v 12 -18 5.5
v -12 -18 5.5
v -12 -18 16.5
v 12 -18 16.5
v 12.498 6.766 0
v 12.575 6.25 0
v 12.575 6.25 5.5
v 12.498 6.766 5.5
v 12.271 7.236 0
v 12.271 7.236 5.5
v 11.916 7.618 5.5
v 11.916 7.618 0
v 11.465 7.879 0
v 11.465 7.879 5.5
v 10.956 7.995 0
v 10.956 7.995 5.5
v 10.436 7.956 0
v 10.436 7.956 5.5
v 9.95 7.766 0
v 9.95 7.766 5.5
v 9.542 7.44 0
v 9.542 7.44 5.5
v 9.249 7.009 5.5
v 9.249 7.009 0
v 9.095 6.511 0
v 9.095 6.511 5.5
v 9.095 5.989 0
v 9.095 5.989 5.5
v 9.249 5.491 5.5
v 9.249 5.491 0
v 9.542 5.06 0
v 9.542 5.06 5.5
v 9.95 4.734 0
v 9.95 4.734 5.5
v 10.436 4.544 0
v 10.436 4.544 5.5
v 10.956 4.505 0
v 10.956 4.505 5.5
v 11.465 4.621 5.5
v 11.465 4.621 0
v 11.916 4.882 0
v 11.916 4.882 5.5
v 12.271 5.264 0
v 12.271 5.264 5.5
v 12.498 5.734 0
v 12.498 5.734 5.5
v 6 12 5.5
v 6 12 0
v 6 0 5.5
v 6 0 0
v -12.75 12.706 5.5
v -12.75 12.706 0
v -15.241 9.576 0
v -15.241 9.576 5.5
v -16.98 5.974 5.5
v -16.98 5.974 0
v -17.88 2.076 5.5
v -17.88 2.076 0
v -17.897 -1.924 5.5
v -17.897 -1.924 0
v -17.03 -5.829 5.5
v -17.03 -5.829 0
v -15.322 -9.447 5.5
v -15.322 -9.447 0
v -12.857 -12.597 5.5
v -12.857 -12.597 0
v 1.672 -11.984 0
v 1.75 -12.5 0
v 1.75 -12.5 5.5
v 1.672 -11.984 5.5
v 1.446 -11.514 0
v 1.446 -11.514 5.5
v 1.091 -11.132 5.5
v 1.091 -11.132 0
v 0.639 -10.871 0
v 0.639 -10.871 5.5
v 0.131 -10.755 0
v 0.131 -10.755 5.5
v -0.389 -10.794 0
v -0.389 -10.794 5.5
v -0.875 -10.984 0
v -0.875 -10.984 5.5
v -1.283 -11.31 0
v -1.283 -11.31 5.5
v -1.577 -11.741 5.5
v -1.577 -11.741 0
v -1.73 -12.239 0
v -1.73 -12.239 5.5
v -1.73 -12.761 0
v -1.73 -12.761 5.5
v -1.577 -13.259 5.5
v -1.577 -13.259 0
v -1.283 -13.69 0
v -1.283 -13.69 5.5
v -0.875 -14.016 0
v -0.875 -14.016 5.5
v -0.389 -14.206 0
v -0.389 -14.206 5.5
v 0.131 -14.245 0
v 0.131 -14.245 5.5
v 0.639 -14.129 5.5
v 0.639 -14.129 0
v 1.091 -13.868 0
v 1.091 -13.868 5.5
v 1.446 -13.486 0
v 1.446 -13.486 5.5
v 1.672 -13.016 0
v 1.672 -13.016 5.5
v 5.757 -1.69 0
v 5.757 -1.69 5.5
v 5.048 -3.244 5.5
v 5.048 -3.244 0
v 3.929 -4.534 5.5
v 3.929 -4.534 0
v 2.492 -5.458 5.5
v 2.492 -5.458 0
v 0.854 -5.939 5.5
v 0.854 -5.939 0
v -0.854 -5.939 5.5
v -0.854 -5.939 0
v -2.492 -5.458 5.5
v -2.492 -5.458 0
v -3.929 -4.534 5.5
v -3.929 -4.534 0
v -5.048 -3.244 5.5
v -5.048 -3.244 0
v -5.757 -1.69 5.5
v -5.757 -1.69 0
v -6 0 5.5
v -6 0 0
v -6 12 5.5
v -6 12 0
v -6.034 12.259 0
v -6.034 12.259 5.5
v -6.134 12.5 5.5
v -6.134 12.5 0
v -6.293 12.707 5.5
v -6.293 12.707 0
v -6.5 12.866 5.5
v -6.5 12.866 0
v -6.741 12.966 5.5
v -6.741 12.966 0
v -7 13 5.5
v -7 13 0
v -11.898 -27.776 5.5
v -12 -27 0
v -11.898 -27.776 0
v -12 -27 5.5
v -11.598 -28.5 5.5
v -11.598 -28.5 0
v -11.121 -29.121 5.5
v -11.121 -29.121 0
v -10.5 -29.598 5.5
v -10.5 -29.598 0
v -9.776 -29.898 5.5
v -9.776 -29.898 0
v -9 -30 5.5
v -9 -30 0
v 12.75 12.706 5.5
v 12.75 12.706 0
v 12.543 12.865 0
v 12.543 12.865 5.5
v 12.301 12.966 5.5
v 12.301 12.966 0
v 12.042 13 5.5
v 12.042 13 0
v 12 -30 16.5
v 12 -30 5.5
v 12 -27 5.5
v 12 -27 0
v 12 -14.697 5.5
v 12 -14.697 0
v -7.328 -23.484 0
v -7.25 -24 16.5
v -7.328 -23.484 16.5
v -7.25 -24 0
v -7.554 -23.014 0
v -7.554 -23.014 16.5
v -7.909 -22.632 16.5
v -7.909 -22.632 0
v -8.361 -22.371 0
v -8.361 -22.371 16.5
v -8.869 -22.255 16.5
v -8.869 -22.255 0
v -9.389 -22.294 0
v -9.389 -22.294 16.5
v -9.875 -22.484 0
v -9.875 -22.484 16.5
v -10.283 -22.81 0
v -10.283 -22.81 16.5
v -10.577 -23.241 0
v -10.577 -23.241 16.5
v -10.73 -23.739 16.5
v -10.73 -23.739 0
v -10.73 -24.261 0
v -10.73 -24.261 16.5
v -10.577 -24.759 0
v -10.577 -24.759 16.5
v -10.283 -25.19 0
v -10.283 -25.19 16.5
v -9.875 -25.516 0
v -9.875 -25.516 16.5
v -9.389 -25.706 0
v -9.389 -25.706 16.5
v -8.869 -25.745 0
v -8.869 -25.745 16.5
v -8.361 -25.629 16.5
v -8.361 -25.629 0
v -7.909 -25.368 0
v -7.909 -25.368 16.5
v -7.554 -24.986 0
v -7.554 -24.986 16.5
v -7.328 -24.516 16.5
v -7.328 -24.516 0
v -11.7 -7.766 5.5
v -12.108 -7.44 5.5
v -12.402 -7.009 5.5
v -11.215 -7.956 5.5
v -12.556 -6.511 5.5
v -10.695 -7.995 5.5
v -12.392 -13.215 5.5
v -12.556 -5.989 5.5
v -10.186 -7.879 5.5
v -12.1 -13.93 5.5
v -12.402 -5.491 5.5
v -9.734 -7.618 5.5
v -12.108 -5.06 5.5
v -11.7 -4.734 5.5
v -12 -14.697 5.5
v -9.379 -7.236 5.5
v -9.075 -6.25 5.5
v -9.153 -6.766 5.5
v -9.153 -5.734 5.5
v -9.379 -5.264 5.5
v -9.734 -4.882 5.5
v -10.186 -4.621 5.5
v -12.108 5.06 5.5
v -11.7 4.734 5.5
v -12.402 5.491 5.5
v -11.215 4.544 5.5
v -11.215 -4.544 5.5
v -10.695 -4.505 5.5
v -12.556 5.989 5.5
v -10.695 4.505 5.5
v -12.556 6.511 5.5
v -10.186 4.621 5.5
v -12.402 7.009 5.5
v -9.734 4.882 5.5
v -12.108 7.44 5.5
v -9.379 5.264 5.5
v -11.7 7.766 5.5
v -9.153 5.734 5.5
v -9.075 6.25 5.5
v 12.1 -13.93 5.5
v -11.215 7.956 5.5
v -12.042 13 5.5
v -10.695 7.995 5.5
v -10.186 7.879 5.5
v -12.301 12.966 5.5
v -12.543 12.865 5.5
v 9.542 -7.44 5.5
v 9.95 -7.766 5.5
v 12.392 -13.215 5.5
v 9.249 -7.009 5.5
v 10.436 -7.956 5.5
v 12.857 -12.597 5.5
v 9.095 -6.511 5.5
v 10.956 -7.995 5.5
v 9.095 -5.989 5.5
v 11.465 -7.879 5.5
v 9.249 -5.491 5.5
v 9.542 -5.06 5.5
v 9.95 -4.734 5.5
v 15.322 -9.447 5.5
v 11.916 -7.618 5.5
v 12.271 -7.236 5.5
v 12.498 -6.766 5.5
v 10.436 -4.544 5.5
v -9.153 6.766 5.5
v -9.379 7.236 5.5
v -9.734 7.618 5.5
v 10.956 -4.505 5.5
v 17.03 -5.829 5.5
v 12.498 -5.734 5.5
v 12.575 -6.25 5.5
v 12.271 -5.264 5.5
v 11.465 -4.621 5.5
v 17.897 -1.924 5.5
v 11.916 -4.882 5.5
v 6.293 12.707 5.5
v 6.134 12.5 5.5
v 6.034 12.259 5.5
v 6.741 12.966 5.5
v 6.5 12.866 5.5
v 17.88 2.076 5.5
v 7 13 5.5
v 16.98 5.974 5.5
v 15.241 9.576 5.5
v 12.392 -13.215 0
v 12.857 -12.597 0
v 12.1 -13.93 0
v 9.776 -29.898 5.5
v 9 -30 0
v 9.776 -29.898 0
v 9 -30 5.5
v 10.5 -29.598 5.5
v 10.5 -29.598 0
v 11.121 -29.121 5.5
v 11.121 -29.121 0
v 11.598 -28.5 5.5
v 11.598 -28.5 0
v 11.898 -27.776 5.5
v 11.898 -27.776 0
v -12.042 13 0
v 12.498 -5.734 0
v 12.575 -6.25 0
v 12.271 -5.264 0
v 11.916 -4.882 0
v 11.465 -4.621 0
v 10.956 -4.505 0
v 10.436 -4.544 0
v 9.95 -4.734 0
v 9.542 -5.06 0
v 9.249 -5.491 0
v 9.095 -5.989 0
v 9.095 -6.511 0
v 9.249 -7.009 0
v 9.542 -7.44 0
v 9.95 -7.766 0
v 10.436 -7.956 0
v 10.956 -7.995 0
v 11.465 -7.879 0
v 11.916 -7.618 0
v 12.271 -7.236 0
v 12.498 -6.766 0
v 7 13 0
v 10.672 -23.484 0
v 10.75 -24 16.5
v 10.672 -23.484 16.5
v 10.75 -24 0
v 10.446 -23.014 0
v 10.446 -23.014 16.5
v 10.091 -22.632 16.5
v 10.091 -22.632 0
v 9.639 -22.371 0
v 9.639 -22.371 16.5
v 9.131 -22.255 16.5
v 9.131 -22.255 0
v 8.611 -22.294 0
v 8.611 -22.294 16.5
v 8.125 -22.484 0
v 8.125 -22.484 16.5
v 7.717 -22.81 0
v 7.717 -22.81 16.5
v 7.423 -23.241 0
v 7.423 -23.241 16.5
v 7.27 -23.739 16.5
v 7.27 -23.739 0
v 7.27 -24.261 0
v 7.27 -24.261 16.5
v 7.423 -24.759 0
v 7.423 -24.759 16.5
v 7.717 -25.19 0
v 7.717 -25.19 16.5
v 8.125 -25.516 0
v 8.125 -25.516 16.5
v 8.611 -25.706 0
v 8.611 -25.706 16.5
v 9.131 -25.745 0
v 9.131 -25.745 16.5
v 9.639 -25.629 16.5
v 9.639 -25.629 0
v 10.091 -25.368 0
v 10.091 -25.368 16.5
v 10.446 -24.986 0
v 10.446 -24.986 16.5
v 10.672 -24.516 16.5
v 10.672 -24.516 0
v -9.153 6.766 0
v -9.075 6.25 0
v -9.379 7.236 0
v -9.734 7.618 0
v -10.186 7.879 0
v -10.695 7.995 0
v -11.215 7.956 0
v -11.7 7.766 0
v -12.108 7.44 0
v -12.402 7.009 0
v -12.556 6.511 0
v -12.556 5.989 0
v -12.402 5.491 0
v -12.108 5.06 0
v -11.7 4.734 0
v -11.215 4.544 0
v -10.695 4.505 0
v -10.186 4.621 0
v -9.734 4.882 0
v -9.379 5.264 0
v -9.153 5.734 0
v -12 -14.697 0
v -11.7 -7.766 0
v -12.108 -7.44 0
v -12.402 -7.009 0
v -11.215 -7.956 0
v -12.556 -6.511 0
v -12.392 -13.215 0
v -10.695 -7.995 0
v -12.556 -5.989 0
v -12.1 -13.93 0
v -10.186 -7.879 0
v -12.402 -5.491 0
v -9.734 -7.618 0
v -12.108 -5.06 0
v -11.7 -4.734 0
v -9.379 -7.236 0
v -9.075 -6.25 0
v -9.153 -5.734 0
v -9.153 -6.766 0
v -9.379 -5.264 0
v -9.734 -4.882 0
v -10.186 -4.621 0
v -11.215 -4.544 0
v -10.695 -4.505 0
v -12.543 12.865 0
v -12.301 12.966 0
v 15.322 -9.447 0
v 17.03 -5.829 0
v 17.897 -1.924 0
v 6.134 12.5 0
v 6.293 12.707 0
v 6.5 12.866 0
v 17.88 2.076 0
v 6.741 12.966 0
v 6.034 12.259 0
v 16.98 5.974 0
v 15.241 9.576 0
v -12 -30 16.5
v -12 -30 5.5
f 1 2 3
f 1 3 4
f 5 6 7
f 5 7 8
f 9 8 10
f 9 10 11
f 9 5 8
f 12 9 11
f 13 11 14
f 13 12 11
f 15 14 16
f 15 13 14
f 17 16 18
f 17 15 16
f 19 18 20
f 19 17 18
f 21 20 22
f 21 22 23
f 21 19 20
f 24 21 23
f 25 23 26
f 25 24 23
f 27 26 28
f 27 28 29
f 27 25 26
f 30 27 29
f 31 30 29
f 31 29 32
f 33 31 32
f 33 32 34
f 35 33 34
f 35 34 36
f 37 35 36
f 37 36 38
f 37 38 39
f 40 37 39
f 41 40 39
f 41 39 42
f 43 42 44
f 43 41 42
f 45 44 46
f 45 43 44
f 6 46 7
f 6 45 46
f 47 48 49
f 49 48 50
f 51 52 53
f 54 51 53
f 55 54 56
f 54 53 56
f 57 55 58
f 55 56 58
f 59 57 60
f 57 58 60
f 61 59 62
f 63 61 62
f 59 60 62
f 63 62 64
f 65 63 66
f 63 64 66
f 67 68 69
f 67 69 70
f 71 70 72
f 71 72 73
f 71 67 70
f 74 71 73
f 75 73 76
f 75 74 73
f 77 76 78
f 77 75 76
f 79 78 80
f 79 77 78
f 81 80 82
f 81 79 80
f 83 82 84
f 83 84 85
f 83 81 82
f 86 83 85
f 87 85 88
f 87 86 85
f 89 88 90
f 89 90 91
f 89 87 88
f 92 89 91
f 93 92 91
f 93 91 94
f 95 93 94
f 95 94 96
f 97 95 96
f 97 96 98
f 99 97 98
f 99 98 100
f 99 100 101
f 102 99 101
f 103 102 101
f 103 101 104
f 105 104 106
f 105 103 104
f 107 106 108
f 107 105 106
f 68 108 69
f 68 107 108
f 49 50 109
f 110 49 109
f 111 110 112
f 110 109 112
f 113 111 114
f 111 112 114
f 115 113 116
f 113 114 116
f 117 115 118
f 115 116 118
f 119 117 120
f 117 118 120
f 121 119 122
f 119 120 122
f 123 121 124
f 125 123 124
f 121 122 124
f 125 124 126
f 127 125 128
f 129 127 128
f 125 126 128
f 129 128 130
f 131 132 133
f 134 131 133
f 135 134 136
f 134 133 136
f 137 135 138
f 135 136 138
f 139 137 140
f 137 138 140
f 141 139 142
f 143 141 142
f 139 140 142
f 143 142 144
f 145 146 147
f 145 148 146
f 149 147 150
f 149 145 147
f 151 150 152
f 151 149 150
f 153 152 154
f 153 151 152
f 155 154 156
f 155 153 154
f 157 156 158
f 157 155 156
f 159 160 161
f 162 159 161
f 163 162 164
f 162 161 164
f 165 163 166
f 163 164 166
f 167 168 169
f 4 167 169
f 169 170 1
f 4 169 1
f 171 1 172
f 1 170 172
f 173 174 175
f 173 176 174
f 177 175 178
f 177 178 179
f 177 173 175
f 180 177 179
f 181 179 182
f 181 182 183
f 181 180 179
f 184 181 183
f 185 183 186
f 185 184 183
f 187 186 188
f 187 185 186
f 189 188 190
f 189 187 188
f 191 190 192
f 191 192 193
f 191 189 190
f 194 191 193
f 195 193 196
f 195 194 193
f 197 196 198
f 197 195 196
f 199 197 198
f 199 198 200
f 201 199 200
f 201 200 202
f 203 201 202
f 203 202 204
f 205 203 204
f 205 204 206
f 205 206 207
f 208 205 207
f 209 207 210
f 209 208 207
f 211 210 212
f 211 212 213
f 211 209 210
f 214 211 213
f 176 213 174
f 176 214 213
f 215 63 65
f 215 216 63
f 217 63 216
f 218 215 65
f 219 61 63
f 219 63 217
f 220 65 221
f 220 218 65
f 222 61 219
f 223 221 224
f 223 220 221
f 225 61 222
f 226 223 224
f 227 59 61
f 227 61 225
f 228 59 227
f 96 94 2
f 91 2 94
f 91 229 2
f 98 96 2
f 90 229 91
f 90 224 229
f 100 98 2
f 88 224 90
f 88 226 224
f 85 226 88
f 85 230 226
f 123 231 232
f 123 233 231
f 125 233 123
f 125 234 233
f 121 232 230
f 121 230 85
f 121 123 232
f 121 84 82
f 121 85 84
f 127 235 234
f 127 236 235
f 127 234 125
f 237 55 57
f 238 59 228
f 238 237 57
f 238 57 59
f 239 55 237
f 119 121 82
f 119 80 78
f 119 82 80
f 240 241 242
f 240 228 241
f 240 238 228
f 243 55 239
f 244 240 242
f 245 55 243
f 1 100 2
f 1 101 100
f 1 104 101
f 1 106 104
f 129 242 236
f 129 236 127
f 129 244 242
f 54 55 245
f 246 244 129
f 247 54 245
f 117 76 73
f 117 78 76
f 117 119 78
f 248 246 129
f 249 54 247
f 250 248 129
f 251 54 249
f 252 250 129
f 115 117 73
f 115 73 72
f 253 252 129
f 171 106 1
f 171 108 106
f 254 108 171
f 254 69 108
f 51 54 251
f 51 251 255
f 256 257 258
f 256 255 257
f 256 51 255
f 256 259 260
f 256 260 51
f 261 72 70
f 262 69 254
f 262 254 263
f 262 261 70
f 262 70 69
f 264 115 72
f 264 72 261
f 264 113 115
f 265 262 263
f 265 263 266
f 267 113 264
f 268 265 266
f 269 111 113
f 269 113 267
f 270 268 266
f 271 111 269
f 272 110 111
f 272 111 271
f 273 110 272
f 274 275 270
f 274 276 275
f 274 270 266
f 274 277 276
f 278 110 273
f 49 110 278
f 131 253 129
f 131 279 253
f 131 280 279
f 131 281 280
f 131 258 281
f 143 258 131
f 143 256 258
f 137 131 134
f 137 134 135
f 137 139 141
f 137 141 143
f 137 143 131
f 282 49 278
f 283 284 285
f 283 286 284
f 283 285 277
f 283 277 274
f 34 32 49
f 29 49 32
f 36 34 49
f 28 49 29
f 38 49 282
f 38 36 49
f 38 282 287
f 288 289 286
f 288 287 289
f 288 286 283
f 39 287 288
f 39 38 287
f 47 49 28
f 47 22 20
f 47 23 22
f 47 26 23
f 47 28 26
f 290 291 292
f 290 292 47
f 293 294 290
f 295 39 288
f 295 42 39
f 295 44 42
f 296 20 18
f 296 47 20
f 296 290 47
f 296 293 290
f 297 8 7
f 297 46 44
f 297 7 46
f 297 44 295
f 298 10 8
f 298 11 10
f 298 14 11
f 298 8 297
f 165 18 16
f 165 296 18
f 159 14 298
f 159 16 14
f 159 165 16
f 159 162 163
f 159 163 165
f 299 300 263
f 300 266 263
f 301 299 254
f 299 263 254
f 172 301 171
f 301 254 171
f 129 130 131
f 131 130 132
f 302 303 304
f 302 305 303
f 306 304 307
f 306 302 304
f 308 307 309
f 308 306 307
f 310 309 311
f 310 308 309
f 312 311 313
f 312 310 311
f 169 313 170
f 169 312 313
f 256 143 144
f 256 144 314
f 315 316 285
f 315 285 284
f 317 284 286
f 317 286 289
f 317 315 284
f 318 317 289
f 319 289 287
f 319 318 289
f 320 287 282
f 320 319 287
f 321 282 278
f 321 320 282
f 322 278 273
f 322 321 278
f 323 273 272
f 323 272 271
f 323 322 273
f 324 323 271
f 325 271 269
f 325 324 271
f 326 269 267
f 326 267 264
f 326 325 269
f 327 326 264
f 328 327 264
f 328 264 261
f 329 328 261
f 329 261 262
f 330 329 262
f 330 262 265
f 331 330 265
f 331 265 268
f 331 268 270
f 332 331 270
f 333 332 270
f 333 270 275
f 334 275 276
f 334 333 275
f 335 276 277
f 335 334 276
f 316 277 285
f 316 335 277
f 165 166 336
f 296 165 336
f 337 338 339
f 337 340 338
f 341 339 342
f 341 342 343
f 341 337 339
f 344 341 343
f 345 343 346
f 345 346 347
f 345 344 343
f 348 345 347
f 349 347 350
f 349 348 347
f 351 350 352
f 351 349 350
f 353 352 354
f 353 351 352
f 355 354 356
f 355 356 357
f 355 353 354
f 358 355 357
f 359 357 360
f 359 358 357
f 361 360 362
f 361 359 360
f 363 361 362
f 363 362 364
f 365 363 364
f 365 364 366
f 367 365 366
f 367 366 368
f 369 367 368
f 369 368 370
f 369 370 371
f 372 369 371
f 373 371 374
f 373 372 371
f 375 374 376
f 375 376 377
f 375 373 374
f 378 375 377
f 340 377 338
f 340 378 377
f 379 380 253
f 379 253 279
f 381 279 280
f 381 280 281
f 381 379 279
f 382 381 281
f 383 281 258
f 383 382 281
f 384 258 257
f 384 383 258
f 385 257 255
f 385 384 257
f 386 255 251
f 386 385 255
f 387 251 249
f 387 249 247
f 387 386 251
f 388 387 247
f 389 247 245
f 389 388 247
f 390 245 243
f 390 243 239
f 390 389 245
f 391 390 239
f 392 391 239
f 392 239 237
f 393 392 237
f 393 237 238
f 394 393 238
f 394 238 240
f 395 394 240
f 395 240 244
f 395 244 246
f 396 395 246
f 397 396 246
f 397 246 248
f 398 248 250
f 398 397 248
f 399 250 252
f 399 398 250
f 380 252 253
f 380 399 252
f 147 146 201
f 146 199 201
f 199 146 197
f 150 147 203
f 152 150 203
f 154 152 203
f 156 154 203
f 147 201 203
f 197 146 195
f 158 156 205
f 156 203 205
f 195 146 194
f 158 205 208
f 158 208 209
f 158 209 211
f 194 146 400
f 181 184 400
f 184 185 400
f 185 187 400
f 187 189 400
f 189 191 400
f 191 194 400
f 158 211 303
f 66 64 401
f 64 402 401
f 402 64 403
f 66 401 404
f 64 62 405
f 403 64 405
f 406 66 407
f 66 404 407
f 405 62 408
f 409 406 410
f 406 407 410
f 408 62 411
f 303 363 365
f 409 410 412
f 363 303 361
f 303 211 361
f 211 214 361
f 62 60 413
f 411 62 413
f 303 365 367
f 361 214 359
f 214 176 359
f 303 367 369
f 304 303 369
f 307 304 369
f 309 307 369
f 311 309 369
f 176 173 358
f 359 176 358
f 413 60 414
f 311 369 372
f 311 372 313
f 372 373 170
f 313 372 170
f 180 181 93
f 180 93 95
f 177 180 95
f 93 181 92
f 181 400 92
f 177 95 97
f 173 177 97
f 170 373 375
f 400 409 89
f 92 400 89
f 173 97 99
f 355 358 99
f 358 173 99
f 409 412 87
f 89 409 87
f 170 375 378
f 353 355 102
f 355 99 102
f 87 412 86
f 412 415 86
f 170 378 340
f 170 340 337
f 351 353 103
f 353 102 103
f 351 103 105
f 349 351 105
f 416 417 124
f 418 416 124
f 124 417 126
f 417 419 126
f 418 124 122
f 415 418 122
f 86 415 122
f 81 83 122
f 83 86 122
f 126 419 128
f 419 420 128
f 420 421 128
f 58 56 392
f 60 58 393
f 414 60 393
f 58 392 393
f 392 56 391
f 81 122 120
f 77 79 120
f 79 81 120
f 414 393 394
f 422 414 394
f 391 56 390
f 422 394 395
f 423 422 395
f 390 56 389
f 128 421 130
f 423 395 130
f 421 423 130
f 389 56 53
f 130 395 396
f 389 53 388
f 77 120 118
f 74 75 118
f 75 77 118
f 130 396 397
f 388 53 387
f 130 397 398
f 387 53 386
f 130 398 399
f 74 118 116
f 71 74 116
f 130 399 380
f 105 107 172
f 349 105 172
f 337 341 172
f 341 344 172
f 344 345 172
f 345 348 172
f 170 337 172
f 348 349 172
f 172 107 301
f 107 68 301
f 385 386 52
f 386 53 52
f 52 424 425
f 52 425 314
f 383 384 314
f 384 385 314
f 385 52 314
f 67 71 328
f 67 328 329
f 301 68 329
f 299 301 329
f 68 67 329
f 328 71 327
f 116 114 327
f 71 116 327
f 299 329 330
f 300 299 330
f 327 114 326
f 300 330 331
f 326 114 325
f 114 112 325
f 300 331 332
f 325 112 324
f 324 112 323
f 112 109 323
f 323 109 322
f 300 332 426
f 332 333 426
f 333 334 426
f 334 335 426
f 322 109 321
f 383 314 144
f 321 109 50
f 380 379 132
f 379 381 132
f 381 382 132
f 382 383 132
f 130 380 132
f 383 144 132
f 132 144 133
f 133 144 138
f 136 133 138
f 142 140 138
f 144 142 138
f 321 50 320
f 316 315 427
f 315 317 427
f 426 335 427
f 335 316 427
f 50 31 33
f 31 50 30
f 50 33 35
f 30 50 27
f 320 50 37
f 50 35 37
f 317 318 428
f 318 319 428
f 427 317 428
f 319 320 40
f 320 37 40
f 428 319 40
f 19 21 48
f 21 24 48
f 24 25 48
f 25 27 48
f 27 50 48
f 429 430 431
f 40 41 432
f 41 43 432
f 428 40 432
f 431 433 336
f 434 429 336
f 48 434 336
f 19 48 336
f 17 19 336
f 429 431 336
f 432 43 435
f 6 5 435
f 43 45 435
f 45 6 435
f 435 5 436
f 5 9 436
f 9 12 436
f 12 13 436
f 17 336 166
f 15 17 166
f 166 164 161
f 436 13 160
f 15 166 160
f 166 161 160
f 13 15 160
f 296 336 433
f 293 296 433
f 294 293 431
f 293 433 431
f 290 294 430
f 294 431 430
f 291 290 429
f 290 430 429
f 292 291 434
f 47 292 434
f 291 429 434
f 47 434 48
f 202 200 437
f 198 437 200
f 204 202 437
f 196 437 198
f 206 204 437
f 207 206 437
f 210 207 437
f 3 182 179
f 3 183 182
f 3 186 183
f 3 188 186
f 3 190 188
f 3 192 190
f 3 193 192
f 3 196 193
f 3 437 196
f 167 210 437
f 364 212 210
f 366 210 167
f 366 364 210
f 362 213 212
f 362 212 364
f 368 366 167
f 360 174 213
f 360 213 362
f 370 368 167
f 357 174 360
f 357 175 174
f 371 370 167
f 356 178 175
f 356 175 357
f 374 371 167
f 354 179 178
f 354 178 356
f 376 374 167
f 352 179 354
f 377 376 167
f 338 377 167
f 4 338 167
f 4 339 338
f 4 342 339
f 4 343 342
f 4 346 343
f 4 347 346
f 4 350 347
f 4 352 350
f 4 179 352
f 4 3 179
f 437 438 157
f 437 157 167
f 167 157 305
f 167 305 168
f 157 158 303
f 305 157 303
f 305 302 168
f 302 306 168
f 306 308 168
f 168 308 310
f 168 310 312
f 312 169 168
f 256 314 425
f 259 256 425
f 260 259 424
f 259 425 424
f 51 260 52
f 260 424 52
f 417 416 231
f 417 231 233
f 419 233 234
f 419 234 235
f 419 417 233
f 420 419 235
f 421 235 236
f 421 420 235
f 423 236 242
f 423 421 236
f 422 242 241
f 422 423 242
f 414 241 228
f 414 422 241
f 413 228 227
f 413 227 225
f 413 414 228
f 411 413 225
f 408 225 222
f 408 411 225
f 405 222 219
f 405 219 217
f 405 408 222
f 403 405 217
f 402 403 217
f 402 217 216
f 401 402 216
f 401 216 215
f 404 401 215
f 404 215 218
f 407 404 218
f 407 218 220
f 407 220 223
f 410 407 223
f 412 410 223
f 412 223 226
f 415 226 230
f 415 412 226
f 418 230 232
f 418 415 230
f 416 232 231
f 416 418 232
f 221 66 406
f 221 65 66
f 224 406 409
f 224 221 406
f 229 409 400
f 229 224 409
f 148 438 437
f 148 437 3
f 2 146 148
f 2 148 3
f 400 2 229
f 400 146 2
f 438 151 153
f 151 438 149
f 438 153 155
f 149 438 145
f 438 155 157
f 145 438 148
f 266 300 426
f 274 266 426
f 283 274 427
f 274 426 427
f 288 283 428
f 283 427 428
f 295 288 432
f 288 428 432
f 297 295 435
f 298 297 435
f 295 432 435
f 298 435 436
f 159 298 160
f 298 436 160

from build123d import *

# Parameters (mm, degrees)
F0_R     = 1.75
F2_DEPTH = 5.5
F1_R     = 1.75
F3_DEPTH = 5.5
F4_R     = 3
F5_W     = 24
F5_H     = 12
F5_R     = 1.75
F6_DEPTH = 11


with BuildPart() as f2:
    # F0 (on Top) → F2 (new body)
    with BuildSketch(Plane.XY):
        with BuildLine():
            ThreePointArc((-12.0415945788, 13), (-12.4250770732, 12.9235481452), (-12.7499236717, 12.7058823529))
            ThreePointArc((-12.7499236717, 12.7058823529), (0, -18), (12.7499236717, 12.7058823529))
            ThreePointArc((12.7499236717, 12.7058823529), (12.4250770732, 12.9235481452), (12.0415945788, 13))
            Line((12.0415945788, 13), (7, 13))
            ThreePointArc((7, 13), (6.2928932188, 12.7071067812), (6, 12))
            Line((6, 12), (6, 0))
            ThreePointArc((6, 0), (0, -6), (-6, 0))
            Line((-6, 0), (-6, 12))
            ThreePointArc((-6, 12), (-6.2928932188, 12.7071067812), (-7, 13))
            Line((-7, 13), (-12.0415945788, 13))
        make_face()
        with Locations((-10.8253175473, -6.25)):
            Circle(F0_R, mode=Mode.SUBTRACT)
        with Locations((0, -12.5)):
            Circle(F0_R, mode=Mode.SUBTRACT)
        with Locations((10.8253175473, -6.25)):
            Circle(F0_R, mode=Mode.SUBTRACT)
        with Locations((-10.8253175473, 6.25)):
            Circle(F0_R, mode=Mode.SUBTRACT)
        with Locations((10.8253175473, 6.25)):
            Circle(F0_R, mode=Mode.SUBTRACT)
    extrude(amount=F2_DEPTH)

    # F1 (on Top) → F3 (join)
    with BuildSketch(Plane.XY):
        Polygon((12, -18), (0, -18), (-12, -18), (-12, -30), (12, -30), align=None)
        with Locations((-9, -24)):
            Circle(F1_R, mode=Mode.SUBTRACT)
        with Locations((9, -24)):
            Circle(F1_R, mode=Mode.SUBTRACT)
        with BuildLine():
            ThreePointArc((12, -13.416407865), (6.4227976159, -16.8151024613), (0, -18))
            Line((0, -18), (12, -18))
            Line((12, -18), (12, -13.416407865))
        make_face()
        with BuildLine():
            ThreePointArc((0, -18), (-6.4227976159, -16.8151024613), (-12, -13.416407865))
            Line((-12, -13.416407865), (-12, -18))
            Line((-12, -18), (0, -18))
        make_face()
    extrude(amount=F3_DEPTH)

    # F4
    f4_edges = [f2.edges().sort_by_distance(p)[0] for p in [
        (-12, -13.416408, 2.75),
        (-12, -30, 2.75),
        (12, -13.416408, 2.75),
        (12, -30, 2.75),
    ]]
    fillet(f4_edges, radius=F4_R)

    # F5 (on face) → F6 (join)
    with BuildSketch(Plane.XY.offset(5.5)):
        with Locations((0, -24)):
            Rectangle(F5_W, F5_H)
        with Locations((-9, -24)):
            Circle(F5_R, mode=Mode.SUBTRACT)
        with Locations((9, -24)):
            Circle(F5_R, mode=Mode.SUBTRACT)
    extrude(amount=F6_DEPTH)


solid = f2.part
